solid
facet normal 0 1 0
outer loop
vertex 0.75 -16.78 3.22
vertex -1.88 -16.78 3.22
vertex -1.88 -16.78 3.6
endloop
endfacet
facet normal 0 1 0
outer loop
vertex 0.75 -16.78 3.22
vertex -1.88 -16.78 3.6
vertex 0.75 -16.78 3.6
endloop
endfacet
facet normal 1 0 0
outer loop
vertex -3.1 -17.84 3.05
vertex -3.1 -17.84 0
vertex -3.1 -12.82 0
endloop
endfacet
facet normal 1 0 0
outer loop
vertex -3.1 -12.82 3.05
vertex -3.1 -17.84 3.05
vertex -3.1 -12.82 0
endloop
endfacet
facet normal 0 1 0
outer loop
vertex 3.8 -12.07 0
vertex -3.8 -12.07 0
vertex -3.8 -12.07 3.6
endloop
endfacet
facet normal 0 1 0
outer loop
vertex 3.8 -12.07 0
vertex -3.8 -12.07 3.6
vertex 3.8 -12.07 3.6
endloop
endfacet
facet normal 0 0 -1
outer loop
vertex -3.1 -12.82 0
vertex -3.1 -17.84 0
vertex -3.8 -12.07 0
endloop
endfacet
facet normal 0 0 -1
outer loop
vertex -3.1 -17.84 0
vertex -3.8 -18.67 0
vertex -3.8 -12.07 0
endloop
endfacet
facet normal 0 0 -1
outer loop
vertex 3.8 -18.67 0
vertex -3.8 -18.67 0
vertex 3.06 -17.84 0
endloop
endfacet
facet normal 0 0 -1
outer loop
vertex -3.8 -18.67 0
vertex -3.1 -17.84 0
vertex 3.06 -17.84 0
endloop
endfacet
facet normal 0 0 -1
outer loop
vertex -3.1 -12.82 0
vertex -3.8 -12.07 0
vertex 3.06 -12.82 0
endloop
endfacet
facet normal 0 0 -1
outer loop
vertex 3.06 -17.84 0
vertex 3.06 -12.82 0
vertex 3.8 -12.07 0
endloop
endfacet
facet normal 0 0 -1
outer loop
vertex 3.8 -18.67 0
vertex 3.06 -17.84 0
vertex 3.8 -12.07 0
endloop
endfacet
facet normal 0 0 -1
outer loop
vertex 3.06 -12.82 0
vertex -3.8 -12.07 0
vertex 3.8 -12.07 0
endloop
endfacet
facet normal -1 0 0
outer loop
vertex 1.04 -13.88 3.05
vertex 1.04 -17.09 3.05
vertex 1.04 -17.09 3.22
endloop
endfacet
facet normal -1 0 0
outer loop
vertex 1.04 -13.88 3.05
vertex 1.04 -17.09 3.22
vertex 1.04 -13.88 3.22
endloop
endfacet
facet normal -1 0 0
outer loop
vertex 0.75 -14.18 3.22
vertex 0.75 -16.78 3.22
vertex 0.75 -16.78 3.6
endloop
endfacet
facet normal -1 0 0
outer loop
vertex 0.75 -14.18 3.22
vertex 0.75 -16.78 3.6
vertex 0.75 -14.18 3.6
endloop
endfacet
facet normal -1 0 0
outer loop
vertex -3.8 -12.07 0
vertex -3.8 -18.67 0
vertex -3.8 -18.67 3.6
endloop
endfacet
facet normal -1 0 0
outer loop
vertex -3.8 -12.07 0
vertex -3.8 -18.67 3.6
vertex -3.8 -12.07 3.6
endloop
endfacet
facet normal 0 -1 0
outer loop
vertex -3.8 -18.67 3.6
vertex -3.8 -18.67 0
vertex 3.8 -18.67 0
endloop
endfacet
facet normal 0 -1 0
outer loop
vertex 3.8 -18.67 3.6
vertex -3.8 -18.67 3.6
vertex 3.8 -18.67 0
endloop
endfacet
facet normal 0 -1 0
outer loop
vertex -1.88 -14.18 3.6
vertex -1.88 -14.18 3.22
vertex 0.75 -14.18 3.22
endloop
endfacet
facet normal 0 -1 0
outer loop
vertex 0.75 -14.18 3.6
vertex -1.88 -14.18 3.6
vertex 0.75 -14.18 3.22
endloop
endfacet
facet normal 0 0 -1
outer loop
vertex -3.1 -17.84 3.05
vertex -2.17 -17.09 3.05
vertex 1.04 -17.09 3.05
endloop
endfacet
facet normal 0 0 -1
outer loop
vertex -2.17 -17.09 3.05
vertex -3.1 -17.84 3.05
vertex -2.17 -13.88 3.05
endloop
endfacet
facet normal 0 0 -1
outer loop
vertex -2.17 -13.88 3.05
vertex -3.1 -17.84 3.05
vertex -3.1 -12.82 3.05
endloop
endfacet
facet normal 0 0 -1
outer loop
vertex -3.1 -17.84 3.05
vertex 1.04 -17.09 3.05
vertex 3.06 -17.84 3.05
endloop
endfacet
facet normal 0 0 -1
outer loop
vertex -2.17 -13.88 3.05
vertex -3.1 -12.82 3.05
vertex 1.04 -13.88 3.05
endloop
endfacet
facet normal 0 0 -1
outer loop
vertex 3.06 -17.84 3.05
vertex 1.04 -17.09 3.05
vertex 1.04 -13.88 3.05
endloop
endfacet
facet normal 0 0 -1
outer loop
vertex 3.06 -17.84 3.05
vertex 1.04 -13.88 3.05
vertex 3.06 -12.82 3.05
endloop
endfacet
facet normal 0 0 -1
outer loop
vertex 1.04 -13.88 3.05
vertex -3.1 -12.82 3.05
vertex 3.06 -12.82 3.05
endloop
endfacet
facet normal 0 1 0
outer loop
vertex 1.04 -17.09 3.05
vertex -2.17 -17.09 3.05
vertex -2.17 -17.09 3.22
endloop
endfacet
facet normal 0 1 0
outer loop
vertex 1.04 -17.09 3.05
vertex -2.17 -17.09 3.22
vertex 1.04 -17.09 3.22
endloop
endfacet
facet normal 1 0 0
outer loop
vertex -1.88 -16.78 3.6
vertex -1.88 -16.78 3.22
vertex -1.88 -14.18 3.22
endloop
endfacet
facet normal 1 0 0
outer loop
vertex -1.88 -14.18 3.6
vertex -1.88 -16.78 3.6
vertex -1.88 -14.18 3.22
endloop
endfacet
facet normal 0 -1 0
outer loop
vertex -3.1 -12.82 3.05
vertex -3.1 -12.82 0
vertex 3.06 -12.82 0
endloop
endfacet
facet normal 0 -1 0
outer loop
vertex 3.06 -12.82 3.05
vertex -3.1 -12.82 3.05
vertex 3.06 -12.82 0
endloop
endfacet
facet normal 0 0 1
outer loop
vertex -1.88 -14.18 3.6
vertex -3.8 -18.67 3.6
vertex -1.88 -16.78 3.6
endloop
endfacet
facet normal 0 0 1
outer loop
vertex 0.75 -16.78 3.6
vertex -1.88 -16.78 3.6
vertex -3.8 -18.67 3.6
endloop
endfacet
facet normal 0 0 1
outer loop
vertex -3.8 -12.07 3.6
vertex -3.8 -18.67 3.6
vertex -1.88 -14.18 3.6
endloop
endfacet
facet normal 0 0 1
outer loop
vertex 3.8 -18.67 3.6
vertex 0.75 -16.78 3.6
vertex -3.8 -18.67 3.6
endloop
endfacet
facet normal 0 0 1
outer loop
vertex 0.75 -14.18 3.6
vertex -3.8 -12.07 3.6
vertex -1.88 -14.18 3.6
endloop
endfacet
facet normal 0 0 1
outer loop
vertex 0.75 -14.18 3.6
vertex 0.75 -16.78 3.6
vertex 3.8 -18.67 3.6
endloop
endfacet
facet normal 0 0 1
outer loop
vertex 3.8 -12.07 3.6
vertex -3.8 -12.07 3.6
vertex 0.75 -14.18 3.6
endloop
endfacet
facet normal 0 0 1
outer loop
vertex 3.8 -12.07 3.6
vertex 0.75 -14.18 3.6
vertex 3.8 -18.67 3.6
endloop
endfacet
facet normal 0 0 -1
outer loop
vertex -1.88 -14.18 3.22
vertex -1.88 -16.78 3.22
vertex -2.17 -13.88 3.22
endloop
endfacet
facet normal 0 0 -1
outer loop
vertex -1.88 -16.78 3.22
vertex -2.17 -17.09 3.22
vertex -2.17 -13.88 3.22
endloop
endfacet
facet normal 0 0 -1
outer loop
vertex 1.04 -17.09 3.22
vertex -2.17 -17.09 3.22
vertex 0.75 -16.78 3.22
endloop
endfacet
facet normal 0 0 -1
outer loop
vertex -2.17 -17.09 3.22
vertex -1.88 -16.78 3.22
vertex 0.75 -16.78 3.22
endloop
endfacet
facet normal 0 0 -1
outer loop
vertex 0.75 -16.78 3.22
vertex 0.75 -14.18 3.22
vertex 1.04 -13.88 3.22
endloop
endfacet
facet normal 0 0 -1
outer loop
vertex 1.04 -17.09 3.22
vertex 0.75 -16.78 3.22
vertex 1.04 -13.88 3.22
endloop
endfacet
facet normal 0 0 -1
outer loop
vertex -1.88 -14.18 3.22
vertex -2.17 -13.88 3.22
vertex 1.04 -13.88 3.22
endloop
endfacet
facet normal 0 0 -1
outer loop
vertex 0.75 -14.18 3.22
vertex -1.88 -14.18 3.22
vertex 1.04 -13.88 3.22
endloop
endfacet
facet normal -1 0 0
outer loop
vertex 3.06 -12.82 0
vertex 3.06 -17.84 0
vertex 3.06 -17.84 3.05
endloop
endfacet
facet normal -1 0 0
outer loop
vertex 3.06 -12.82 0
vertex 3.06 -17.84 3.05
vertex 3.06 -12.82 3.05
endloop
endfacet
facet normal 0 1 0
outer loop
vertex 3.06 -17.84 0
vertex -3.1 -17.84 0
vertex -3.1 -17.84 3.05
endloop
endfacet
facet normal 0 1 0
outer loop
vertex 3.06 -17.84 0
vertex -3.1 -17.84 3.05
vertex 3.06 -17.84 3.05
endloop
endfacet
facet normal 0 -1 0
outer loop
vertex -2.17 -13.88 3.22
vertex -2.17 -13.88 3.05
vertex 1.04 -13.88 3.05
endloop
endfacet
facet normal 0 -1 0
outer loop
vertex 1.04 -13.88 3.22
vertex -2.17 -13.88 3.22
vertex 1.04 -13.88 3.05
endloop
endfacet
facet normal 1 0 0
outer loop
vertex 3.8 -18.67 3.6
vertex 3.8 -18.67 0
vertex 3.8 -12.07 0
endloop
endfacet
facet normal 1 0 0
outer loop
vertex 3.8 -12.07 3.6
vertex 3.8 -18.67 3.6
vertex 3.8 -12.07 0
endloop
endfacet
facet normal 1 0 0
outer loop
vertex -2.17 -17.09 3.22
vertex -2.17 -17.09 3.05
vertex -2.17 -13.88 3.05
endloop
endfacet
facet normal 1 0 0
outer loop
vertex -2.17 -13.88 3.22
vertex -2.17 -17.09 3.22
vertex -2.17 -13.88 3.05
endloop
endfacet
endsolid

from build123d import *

# Parameters (mm, degrees)
SKETCH014_W  = 3.21
SKETCH014_H  = 3.21
PAD012_DEPTH = 0.18
SKETCH013_W  = 2.63
SKETCH013_H  = 2.6
PAD011_DEPTH = 3
SKETCH011_W  = 7.6
SKETCH011_H  = 6.6
PAD010_DEPTH = 3.6
SKETCH012_W  = 6.16
SKETCH012_H  = 5.02
POCKET_DEPTH = 3.05


with BuildPart() as body012:
    # Sketch014 → Pad012 (new body)
    with BuildSketch(Plane.XY):
        with Locations((-0.565, -15.485)):
            Rectangle(SKETCH014_W, SKETCH014_H)
    extrude(amount=PAD012_DEPTH)


with BuildPart() as body012_1:
    # Body012 placement: moved
    add(body012.part.moved(Location((0, 0, 3.04))))


with BuildPart() as outer_shelll_cutout_top:
    # Sketch013 → Pad011 (new body)
    with BuildSketch(Plane.XY):
        with Locations((-0.565, -15.48)):
            Rectangle(SKETCH013_W, SKETCH013_H)
    extrude(amount=PAD011_DEPTH)


with BuildPart() as outer_shelll_cutout_top_1:
    # Body011 placement: moved
    add(outer_shelll_cutout_top.part.moved(Location((0, 0, 1.92))))


with BuildPart() as cut001_outer_shell:
    # Sketch011 → Pad010 (new body)
    with BuildSketch(Plane.XY):
        with Locations((0, -15.37)):
            Rectangle(SKETCH011_W, SKETCH011_H)
    extrude(amount=PAD010_DEPTH)

    # Sketch012 → Pocket (cut)
    with BuildSketch(Plane.XY):
        with Locations((-0.02, -15.33)):
            Rectangle(SKETCH012_W, SKETCH012_H)
    extrude(amount=POCKET_DEPTH, mode=Mode.SUBTRACT)

    # Cut: cut outer_shelll_cutout_top
    add(outer_shelll_cutout_top_1.part, mode=Mode.SUBTRACT)

    # Cut001: cut Body012
    add(body012_1.part, mode=Mode.SUBTRACT)


solid = cut001_outer_shell.part
